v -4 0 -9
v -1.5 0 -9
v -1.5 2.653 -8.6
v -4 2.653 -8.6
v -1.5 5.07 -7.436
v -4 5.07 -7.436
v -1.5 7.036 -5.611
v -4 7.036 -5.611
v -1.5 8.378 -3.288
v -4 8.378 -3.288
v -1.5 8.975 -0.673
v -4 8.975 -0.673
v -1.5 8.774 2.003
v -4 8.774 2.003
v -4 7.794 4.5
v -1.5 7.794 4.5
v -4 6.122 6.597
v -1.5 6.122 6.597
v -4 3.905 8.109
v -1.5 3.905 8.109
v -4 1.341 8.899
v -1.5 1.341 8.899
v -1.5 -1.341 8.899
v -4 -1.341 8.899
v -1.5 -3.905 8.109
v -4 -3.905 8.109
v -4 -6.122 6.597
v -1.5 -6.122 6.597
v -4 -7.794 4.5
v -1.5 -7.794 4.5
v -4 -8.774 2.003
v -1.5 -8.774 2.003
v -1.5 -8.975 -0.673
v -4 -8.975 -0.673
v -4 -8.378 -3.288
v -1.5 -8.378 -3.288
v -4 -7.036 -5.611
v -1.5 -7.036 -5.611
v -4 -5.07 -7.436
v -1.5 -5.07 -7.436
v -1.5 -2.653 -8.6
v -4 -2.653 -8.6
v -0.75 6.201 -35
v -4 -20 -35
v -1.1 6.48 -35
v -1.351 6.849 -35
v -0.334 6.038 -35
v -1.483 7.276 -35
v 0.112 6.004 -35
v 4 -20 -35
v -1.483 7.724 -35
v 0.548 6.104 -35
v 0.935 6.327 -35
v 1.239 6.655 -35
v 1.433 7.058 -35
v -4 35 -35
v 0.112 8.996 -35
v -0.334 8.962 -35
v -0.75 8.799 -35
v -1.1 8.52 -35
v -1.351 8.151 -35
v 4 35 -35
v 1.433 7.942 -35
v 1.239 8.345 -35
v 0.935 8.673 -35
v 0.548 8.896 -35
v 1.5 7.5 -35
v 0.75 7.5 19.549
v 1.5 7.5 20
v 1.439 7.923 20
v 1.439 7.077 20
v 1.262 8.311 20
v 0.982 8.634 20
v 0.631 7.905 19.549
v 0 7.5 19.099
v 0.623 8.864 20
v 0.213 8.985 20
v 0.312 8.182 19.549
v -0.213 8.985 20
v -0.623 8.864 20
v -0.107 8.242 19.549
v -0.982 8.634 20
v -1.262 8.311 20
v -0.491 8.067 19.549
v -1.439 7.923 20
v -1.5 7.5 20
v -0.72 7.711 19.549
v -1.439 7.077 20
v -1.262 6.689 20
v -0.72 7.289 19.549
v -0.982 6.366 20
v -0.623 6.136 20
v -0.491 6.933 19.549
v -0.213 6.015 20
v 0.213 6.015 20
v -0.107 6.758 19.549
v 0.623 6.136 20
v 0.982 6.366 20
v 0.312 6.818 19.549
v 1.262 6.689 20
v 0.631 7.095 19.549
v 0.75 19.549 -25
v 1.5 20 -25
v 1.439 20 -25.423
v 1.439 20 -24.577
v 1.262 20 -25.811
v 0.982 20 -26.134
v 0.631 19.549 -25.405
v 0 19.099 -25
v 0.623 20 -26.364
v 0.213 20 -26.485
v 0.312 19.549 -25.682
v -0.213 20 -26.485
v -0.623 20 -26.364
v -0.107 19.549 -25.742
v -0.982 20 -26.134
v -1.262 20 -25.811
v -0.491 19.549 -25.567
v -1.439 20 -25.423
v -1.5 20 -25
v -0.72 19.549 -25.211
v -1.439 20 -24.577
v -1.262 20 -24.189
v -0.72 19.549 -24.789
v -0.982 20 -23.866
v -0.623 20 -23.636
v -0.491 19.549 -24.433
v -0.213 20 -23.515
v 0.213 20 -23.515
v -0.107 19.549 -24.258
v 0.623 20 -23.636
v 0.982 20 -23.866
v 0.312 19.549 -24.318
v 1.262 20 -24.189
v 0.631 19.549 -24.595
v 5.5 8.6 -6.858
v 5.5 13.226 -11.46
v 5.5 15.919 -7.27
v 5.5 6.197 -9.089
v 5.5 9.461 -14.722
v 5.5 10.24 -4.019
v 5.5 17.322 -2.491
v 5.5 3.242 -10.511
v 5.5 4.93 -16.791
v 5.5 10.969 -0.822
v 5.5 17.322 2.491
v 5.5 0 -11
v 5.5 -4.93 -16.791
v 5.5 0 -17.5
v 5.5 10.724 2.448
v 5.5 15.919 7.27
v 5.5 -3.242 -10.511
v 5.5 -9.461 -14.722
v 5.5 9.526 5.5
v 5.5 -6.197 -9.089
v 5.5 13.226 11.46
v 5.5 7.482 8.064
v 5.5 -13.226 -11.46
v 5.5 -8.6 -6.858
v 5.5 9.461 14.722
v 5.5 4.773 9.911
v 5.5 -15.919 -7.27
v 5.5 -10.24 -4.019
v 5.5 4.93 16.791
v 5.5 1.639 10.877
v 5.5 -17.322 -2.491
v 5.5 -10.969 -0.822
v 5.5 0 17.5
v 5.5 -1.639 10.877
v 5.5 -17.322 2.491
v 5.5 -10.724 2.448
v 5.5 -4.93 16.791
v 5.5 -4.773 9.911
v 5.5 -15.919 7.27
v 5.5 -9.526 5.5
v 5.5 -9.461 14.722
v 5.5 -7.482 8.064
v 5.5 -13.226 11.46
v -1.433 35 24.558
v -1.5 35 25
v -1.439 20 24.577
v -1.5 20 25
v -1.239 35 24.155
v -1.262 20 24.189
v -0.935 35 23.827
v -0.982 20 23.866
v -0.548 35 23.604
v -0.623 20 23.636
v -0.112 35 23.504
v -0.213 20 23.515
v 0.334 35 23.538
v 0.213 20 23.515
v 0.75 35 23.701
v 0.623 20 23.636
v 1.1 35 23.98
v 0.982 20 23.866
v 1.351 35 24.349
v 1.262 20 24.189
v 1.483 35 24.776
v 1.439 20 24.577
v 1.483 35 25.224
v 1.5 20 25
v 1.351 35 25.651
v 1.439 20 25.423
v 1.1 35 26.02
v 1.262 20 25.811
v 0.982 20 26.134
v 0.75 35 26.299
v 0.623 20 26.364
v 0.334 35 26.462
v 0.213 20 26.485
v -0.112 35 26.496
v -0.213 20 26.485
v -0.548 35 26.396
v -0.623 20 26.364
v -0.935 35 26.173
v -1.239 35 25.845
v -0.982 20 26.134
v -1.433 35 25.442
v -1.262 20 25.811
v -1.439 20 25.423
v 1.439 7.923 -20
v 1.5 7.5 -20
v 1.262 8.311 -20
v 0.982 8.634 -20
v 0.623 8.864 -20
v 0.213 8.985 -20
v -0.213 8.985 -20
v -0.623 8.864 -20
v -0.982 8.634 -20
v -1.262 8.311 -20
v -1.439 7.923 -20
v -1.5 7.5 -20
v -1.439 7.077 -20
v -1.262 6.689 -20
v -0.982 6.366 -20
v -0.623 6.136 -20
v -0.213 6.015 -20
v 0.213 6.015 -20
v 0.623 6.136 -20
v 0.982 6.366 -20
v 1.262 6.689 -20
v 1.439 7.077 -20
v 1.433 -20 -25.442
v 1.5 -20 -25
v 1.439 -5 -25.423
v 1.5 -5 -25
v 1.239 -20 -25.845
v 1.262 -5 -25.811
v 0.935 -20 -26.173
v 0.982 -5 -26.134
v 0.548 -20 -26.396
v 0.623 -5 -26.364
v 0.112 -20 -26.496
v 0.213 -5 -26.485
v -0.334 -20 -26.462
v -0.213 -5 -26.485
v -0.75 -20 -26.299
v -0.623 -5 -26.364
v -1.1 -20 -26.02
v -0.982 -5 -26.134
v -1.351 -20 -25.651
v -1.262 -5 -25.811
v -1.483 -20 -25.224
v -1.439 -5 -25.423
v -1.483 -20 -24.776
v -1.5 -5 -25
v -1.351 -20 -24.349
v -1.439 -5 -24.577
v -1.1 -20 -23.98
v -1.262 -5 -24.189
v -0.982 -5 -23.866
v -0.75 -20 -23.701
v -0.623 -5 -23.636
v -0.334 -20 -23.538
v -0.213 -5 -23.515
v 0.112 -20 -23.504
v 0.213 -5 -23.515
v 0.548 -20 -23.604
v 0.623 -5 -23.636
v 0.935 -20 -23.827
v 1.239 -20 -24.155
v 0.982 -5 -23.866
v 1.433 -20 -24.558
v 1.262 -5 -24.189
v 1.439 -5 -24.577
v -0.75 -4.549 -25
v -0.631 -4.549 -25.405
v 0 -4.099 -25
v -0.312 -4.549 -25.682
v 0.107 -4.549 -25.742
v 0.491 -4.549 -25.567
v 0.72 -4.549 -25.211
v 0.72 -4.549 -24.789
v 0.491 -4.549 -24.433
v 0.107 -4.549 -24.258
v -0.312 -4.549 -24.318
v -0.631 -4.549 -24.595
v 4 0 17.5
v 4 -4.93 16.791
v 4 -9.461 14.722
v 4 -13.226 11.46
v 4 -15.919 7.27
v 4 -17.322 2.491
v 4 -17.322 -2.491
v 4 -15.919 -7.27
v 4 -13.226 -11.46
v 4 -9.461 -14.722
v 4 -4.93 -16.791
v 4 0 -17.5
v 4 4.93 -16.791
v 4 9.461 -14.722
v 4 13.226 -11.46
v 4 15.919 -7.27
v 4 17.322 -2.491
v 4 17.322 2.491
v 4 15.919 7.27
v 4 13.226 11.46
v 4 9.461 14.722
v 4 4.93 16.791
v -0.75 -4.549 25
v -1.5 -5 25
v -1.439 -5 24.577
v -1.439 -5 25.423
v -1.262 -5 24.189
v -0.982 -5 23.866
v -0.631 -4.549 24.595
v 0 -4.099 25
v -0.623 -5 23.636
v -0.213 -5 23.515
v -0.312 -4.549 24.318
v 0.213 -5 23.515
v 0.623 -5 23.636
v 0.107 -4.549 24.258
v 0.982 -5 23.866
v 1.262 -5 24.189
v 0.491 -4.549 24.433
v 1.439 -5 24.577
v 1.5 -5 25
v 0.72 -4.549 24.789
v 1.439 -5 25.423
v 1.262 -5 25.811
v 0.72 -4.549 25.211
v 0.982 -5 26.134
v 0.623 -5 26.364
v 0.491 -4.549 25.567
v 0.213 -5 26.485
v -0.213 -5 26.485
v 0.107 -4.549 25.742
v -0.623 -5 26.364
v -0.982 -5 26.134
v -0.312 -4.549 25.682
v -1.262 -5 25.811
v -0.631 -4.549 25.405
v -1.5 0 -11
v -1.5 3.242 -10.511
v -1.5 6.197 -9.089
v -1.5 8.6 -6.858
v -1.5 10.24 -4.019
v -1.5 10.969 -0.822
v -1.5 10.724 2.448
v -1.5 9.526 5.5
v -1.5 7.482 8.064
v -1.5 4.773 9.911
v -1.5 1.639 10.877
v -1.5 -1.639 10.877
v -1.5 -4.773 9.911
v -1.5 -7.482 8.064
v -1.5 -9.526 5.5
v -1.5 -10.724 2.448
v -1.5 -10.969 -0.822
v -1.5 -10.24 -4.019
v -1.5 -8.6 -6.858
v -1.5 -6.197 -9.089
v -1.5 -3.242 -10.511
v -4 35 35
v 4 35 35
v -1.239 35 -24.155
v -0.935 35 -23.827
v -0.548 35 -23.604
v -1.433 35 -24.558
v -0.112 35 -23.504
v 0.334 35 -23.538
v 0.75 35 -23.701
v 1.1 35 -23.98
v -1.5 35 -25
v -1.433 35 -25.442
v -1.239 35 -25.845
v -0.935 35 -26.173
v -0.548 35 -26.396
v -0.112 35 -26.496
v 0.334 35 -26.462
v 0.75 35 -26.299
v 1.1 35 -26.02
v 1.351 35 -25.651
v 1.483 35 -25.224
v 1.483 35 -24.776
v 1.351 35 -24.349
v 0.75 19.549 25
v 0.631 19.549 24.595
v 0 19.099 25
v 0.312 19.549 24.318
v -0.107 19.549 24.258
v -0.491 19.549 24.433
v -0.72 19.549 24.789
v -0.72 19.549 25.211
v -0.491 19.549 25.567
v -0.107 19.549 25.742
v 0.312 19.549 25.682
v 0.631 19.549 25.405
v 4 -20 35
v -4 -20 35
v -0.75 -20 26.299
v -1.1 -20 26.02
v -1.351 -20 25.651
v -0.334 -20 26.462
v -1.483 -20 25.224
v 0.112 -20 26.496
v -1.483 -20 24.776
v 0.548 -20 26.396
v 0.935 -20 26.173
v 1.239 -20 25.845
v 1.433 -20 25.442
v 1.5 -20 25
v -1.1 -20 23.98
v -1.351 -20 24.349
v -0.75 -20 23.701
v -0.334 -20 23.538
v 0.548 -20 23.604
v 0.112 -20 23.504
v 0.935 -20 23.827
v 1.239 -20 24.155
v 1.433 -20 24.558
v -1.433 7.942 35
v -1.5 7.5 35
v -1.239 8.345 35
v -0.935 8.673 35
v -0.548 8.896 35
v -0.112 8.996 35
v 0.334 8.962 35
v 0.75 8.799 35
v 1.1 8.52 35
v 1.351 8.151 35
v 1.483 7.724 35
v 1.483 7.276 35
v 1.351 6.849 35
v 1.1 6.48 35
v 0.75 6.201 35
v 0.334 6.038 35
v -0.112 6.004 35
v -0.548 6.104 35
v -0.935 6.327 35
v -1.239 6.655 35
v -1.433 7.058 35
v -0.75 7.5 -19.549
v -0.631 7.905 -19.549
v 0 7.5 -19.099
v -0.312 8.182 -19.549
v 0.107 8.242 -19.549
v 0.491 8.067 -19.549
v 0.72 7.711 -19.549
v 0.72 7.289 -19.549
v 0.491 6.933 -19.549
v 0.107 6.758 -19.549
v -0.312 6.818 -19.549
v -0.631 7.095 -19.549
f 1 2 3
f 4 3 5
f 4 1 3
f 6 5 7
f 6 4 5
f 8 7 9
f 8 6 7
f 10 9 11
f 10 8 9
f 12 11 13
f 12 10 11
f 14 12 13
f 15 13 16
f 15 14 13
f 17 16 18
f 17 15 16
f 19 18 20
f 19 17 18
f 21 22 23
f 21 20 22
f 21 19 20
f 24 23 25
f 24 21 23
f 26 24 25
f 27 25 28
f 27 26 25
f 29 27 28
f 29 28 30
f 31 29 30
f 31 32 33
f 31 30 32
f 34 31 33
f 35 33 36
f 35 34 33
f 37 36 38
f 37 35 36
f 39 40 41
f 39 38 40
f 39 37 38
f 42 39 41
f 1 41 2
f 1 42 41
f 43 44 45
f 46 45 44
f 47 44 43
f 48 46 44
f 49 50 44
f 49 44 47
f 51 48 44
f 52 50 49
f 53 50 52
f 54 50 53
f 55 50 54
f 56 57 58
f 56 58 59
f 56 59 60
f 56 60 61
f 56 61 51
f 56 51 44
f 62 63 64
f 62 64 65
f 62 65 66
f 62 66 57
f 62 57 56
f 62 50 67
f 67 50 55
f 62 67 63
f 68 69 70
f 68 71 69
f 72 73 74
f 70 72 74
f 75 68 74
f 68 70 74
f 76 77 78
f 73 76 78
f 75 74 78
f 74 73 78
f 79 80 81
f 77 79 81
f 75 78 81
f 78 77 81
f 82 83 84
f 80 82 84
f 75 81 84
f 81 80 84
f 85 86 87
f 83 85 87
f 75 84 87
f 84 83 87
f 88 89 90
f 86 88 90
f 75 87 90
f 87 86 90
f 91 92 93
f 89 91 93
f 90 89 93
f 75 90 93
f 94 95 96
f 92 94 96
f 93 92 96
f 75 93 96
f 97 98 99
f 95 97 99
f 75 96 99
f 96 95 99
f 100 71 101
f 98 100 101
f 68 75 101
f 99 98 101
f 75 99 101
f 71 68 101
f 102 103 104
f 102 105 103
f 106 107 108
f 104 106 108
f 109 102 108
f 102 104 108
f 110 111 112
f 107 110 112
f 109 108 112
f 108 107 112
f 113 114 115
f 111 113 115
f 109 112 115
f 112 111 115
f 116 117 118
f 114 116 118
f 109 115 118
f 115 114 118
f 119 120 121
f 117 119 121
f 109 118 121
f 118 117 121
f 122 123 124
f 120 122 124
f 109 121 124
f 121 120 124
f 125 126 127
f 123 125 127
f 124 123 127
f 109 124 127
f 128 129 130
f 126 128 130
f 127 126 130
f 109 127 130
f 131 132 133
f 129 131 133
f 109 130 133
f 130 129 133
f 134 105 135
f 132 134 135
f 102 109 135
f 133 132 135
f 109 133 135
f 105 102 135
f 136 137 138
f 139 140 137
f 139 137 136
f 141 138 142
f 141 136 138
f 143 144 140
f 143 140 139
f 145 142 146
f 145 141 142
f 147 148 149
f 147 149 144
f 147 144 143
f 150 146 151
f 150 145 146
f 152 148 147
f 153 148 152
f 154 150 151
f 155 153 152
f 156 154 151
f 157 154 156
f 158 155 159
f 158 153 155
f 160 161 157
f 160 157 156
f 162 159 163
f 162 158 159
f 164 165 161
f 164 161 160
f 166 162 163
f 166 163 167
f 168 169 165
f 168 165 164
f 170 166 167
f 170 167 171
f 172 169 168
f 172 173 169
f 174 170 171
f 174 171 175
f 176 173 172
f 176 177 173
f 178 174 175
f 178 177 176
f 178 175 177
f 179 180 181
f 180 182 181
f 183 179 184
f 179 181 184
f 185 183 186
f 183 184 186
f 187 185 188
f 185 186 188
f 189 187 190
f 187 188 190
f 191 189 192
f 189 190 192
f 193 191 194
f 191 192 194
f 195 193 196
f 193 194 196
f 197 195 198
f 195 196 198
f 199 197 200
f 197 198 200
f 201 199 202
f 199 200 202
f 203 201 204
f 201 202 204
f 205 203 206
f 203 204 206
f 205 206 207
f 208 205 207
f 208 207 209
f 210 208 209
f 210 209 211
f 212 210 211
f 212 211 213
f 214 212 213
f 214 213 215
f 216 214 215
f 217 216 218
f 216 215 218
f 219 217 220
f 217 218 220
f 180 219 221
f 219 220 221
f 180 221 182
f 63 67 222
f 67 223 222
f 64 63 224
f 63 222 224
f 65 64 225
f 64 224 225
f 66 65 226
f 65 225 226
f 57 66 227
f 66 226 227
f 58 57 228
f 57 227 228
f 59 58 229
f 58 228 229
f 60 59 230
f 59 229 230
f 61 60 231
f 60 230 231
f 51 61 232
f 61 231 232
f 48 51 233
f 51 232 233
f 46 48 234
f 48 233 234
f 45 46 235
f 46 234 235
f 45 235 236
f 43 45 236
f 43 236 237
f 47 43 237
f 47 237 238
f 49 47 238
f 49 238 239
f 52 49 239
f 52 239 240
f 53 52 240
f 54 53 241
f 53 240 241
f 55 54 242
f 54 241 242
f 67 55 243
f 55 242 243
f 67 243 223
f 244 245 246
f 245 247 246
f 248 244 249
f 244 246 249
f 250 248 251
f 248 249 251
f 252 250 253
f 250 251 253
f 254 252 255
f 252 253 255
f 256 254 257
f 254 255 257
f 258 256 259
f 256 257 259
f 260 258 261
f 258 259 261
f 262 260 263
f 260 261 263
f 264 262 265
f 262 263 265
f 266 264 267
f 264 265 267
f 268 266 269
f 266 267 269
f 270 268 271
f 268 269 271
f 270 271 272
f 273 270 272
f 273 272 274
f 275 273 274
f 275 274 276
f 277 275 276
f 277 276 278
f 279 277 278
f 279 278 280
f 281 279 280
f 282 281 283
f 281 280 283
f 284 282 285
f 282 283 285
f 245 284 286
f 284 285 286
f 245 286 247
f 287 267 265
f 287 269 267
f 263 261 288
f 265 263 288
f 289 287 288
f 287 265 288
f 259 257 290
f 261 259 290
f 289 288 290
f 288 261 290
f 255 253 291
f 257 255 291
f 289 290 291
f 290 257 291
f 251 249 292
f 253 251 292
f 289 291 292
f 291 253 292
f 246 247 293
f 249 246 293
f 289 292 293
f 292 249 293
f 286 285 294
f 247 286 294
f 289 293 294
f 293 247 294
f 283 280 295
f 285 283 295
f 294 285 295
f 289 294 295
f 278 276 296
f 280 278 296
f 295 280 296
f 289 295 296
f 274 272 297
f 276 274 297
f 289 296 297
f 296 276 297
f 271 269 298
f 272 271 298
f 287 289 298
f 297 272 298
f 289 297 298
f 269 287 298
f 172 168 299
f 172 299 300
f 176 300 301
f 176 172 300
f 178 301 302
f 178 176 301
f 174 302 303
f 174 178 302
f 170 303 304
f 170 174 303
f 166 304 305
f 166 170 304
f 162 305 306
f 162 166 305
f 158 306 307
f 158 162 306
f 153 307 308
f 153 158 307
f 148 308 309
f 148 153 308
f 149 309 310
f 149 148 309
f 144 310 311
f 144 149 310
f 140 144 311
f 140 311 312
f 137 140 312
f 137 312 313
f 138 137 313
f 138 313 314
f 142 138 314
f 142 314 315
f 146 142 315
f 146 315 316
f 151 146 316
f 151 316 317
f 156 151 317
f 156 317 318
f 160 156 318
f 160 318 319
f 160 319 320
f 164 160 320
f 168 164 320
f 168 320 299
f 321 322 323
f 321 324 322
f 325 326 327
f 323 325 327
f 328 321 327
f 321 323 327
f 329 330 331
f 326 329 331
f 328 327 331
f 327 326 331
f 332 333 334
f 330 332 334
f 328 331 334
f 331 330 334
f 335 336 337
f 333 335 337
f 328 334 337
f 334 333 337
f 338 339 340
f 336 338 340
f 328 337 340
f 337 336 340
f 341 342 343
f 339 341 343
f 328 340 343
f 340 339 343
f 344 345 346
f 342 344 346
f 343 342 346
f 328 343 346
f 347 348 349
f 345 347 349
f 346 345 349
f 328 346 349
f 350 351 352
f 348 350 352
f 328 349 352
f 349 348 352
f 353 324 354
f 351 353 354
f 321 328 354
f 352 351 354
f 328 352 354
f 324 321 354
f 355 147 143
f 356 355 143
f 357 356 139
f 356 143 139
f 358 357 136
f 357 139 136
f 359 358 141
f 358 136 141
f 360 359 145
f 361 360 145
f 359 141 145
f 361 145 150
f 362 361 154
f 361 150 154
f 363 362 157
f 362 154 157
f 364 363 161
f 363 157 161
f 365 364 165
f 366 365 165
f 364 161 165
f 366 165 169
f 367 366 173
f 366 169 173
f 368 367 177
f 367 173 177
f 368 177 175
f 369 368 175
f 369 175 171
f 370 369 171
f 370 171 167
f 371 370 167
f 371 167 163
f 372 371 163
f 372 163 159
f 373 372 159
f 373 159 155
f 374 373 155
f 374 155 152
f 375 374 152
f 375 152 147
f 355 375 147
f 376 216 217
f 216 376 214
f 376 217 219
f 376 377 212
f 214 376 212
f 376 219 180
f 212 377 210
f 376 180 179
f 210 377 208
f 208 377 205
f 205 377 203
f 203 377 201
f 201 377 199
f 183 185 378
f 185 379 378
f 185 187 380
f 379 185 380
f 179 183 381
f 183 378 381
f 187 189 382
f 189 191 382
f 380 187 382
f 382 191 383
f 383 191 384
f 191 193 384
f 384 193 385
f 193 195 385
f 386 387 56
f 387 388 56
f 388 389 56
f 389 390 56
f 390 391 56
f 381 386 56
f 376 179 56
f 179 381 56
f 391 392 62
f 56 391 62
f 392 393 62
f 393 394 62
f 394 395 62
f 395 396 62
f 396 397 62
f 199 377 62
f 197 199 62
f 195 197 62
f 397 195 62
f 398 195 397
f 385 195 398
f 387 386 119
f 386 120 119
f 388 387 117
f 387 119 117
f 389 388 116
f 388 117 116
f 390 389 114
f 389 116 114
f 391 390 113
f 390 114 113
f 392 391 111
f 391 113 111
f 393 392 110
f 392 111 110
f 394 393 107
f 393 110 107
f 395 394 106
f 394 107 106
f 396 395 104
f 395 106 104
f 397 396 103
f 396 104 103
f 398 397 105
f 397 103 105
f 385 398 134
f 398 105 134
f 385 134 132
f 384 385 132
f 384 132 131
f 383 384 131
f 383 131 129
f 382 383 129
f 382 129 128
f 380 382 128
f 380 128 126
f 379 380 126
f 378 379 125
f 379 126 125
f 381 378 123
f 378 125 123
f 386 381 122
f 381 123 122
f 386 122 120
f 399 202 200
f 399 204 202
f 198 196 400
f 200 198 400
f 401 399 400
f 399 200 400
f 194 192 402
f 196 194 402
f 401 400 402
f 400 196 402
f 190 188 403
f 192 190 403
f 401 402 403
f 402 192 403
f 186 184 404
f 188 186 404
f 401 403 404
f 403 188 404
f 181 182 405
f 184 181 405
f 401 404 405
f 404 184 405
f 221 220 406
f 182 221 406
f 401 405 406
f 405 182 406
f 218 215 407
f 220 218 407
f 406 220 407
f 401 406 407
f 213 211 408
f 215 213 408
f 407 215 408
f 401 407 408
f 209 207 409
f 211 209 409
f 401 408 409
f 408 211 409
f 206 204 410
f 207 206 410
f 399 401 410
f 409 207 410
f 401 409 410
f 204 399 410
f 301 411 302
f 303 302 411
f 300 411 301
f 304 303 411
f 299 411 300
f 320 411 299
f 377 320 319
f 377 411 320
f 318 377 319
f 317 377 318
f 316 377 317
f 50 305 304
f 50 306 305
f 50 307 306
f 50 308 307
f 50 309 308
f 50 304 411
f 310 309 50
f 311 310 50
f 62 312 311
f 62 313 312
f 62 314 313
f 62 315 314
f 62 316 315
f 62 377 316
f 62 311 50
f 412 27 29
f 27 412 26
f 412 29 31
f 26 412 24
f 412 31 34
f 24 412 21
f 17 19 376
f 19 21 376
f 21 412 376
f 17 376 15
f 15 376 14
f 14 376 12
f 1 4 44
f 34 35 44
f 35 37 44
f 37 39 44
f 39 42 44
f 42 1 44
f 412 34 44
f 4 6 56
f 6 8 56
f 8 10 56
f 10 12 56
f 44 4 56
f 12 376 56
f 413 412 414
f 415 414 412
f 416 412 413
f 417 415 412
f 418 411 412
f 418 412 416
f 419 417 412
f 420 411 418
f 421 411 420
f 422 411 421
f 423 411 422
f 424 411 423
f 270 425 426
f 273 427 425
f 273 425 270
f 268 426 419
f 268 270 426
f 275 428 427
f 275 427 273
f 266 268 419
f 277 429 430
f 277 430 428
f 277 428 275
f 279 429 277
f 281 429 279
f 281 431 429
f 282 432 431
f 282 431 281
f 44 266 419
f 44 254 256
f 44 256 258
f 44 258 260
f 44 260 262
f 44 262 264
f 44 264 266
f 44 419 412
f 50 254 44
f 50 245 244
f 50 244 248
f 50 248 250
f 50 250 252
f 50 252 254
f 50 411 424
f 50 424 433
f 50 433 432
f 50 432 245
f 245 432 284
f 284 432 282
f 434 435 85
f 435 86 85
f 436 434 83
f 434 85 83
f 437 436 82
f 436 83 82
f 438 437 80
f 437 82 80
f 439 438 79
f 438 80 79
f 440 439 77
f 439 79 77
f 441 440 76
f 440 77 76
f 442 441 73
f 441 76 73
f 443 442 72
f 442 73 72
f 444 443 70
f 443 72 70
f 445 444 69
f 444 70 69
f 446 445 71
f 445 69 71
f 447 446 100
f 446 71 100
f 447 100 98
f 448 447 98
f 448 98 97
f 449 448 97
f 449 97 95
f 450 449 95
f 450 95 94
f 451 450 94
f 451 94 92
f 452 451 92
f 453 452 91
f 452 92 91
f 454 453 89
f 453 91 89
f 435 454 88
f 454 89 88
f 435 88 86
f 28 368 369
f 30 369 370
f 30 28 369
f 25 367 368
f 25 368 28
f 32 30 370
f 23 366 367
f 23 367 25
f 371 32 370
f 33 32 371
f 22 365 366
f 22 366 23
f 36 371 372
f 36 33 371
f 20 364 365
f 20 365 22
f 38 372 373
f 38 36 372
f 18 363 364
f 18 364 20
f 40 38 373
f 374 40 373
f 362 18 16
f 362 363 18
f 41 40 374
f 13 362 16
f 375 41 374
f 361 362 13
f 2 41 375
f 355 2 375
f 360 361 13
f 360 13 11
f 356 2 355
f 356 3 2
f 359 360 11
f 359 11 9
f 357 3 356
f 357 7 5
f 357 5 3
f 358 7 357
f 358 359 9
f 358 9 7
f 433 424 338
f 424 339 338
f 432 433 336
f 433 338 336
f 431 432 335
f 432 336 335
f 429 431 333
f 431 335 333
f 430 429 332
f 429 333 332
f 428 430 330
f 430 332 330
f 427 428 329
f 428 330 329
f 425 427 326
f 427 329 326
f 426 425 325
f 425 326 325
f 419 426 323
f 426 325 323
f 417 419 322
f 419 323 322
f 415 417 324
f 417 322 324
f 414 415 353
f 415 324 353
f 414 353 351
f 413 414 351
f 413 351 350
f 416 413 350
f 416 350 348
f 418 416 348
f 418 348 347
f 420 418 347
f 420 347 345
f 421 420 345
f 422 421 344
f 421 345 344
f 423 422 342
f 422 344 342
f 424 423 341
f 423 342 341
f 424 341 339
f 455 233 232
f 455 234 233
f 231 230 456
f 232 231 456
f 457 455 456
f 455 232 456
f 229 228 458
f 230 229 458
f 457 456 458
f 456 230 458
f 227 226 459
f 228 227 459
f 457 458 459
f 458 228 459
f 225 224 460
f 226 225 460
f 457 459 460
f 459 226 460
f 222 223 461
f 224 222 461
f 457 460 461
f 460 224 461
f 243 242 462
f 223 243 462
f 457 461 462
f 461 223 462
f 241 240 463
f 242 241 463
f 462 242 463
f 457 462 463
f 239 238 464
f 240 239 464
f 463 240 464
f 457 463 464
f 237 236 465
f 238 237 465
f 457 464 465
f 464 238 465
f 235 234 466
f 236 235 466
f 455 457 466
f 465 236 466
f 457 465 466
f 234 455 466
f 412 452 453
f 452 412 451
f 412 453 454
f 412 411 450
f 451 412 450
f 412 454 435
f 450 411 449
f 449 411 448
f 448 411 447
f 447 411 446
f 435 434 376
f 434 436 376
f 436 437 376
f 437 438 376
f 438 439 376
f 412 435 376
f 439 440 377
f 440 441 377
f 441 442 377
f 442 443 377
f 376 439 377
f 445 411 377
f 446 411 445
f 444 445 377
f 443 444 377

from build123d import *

# Parameters (mm, degrees)
ESQUISSE1_W               = 70
ESQUISSE1_H               = 55
ESQUISSE1_R               = 9
BOSS_EXTRU_1_DEPTH        = 4
ESQUISSE2_R               = 11
ENL_V_MAT_EXTRU_1_DEPTH   = 5.5
TROU_TARAUD_M4X0_71_D     = 3
TROU_TARAUD_M4X0_71_DEPTH = 15
TROU_TARAUD_M4X0_71_TIP   = 0.901290929
TROU_TARAUD_M4X0_72_D     = 3
TROU_TARAUD_M4X0_72_DEPTH = 15
TROU_TARAUD_M4X0_72_TIP   = 0.901290929
TROU_TARAUD_M4X0_73_D     = 3
TROU_TARAUD_M4X0_73_DEPTH = 15
TROU_TARAUD_M4X0_73_TIP   = 0.901290929
TROU_TARAUD_M4X0_74_D     = 3
TROU_TARAUD_M4X0_74_DEPTH = 15
TROU_TARAUD_M4X0_74_TIP   = 0.901290929
BOSS_EXTRU_2_START        = 7
ESQUISSE11_R              = 17.5
ESQUISSE11_R_2            = 11
BOSS_EXTRU_2_DEPTH        = 7


with BuildPart() as part:
    # Esquisse1 → Boss.-Extru.1 (new, symmetric)
    with BuildSketch(Plane(origin=(0, 0, 0), x_dir=(0, 0, -1), z_dir=(1, 0, 0))):
        with Locations((0, 7.5)):
            Rectangle(ESQUISSE1_W, ESQUISSE1_H)
        Circle(ESQUISSE1_R, mode=Mode.SUBTRACT)
    extrude(amount=BOSS_EXTRU_1_DEPTH, both=True)

    # Esquisse2 → Enlèv. mat.-Extru.1 (cut)
    with BuildSketch(Plane(origin=(4, 0, 0), x_dir=(0, 0, -1), z_dir=(1, 0, 0))):
        Circle(ESQUISSE2_R)
    extrude(amount=-ENL_V_MAT_EXTRU_1_DEPTH, mode=Mode.SUBTRACT)

    # Trou taraudé M4x0.71
    with Locations(Plane(origin=(0, -20, 0), x_dir=(-1, 0, 0), z_dir=(0, -1, 0))):
        with Locations((0, -25), (0, 25)):
            Hole(TROU_TARAUD_M4X0_71_D / 2, depth=TROU_TARAUD_M4X0_71_DEPTH)
            with Locations((0, 0, -(TROU_TARAUD_M4X0_71_DEPTH + TROU_TARAUD_M4X0_71_TIP / 2))):  # 118° drill point
                Cone(0, TROU_TARAUD_M4X0_71_D / 2, TROU_TARAUD_M4X0_71_TIP, mode=Mode.SUBTRACT)

    # Trou taraudé M4x0.72
    with Locations(Plane(origin=(0, 35, 0), x_dir=(1, 0, 0), z_dir=(0, 1, 0))):
        with Locations((0, -25), (0, 25)):
            Hole(TROU_TARAUD_M4X0_72_D / 2, depth=TROU_TARAUD_M4X0_72_DEPTH)
            with Locations((0, 0, -(TROU_TARAUD_M4X0_72_DEPTH + TROU_TARAUD_M4X0_72_TIP / 2))):  # 118° drill point
                Cone(0, TROU_TARAUD_M4X0_72_D / 2, TROU_TARAUD_M4X0_72_TIP, mode=Mode.SUBTRACT)

    # Trou taraudé M4x0.73
    with Locations(Plane.XY.offset(35)):
        with Locations((0, 7.5)):
            Hole(TROU_TARAUD_M4X0_73_D / 2, depth=TROU_TARAUD_M4X0_73_DEPTH)
            with Locations((0, 0, -(TROU_TARAUD_M4X0_73_DEPTH + TROU_TARAUD_M4X0_73_TIP / 2))):  # 118° drill point
                Cone(0, TROU_TARAUD_M4X0_73_D / 2, TROU_TARAUD_M4X0_73_TIP, mode=Mode.SUBTRACT)

    # Trou taraudé M4x0.74
    with Locations(Plane(origin=(0, 0, -35), x_dir=(-1, 0, 0), z_dir=(0, 0, -1))):
        with Locations((0, 7.5)):
            Hole(TROU_TARAUD_M4X0_74_D / 2, depth=TROU_TARAUD_M4X0_74_DEPTH)
            with Locations((0, 0, -(TROU_TARAUD_M4X0_74_DEPTH + TROU_TARAUD_M4X0_74_TIP / 2))):  # 118° drill point
                Cone(0, TROU_TARAUD_M4X0_74_D / 2, TROU_TARAUD_M4X0_74_TIP, mode=Mode.SUBTRACT)

    # Esquisse11 → Boss.-Extru.2 (add)
    with BuildSketch(Plane(origin=(-1.5, 0, 0), x_dir=(0, 0, -1), z_dir=(1, 0, 0)).offset(BOSS_EXTRU_2_START)):
        with Locations(Location((0, 0, 0), (0, 0, 180))):
            Circle(ESQUISSE11_R)
        Circle(ESQUISSE11_R_2, mode=Mode.SUBTRACT)
    extrude(amount=-BOSS_EXTRU_2_DEPTH)


solid = part.part
